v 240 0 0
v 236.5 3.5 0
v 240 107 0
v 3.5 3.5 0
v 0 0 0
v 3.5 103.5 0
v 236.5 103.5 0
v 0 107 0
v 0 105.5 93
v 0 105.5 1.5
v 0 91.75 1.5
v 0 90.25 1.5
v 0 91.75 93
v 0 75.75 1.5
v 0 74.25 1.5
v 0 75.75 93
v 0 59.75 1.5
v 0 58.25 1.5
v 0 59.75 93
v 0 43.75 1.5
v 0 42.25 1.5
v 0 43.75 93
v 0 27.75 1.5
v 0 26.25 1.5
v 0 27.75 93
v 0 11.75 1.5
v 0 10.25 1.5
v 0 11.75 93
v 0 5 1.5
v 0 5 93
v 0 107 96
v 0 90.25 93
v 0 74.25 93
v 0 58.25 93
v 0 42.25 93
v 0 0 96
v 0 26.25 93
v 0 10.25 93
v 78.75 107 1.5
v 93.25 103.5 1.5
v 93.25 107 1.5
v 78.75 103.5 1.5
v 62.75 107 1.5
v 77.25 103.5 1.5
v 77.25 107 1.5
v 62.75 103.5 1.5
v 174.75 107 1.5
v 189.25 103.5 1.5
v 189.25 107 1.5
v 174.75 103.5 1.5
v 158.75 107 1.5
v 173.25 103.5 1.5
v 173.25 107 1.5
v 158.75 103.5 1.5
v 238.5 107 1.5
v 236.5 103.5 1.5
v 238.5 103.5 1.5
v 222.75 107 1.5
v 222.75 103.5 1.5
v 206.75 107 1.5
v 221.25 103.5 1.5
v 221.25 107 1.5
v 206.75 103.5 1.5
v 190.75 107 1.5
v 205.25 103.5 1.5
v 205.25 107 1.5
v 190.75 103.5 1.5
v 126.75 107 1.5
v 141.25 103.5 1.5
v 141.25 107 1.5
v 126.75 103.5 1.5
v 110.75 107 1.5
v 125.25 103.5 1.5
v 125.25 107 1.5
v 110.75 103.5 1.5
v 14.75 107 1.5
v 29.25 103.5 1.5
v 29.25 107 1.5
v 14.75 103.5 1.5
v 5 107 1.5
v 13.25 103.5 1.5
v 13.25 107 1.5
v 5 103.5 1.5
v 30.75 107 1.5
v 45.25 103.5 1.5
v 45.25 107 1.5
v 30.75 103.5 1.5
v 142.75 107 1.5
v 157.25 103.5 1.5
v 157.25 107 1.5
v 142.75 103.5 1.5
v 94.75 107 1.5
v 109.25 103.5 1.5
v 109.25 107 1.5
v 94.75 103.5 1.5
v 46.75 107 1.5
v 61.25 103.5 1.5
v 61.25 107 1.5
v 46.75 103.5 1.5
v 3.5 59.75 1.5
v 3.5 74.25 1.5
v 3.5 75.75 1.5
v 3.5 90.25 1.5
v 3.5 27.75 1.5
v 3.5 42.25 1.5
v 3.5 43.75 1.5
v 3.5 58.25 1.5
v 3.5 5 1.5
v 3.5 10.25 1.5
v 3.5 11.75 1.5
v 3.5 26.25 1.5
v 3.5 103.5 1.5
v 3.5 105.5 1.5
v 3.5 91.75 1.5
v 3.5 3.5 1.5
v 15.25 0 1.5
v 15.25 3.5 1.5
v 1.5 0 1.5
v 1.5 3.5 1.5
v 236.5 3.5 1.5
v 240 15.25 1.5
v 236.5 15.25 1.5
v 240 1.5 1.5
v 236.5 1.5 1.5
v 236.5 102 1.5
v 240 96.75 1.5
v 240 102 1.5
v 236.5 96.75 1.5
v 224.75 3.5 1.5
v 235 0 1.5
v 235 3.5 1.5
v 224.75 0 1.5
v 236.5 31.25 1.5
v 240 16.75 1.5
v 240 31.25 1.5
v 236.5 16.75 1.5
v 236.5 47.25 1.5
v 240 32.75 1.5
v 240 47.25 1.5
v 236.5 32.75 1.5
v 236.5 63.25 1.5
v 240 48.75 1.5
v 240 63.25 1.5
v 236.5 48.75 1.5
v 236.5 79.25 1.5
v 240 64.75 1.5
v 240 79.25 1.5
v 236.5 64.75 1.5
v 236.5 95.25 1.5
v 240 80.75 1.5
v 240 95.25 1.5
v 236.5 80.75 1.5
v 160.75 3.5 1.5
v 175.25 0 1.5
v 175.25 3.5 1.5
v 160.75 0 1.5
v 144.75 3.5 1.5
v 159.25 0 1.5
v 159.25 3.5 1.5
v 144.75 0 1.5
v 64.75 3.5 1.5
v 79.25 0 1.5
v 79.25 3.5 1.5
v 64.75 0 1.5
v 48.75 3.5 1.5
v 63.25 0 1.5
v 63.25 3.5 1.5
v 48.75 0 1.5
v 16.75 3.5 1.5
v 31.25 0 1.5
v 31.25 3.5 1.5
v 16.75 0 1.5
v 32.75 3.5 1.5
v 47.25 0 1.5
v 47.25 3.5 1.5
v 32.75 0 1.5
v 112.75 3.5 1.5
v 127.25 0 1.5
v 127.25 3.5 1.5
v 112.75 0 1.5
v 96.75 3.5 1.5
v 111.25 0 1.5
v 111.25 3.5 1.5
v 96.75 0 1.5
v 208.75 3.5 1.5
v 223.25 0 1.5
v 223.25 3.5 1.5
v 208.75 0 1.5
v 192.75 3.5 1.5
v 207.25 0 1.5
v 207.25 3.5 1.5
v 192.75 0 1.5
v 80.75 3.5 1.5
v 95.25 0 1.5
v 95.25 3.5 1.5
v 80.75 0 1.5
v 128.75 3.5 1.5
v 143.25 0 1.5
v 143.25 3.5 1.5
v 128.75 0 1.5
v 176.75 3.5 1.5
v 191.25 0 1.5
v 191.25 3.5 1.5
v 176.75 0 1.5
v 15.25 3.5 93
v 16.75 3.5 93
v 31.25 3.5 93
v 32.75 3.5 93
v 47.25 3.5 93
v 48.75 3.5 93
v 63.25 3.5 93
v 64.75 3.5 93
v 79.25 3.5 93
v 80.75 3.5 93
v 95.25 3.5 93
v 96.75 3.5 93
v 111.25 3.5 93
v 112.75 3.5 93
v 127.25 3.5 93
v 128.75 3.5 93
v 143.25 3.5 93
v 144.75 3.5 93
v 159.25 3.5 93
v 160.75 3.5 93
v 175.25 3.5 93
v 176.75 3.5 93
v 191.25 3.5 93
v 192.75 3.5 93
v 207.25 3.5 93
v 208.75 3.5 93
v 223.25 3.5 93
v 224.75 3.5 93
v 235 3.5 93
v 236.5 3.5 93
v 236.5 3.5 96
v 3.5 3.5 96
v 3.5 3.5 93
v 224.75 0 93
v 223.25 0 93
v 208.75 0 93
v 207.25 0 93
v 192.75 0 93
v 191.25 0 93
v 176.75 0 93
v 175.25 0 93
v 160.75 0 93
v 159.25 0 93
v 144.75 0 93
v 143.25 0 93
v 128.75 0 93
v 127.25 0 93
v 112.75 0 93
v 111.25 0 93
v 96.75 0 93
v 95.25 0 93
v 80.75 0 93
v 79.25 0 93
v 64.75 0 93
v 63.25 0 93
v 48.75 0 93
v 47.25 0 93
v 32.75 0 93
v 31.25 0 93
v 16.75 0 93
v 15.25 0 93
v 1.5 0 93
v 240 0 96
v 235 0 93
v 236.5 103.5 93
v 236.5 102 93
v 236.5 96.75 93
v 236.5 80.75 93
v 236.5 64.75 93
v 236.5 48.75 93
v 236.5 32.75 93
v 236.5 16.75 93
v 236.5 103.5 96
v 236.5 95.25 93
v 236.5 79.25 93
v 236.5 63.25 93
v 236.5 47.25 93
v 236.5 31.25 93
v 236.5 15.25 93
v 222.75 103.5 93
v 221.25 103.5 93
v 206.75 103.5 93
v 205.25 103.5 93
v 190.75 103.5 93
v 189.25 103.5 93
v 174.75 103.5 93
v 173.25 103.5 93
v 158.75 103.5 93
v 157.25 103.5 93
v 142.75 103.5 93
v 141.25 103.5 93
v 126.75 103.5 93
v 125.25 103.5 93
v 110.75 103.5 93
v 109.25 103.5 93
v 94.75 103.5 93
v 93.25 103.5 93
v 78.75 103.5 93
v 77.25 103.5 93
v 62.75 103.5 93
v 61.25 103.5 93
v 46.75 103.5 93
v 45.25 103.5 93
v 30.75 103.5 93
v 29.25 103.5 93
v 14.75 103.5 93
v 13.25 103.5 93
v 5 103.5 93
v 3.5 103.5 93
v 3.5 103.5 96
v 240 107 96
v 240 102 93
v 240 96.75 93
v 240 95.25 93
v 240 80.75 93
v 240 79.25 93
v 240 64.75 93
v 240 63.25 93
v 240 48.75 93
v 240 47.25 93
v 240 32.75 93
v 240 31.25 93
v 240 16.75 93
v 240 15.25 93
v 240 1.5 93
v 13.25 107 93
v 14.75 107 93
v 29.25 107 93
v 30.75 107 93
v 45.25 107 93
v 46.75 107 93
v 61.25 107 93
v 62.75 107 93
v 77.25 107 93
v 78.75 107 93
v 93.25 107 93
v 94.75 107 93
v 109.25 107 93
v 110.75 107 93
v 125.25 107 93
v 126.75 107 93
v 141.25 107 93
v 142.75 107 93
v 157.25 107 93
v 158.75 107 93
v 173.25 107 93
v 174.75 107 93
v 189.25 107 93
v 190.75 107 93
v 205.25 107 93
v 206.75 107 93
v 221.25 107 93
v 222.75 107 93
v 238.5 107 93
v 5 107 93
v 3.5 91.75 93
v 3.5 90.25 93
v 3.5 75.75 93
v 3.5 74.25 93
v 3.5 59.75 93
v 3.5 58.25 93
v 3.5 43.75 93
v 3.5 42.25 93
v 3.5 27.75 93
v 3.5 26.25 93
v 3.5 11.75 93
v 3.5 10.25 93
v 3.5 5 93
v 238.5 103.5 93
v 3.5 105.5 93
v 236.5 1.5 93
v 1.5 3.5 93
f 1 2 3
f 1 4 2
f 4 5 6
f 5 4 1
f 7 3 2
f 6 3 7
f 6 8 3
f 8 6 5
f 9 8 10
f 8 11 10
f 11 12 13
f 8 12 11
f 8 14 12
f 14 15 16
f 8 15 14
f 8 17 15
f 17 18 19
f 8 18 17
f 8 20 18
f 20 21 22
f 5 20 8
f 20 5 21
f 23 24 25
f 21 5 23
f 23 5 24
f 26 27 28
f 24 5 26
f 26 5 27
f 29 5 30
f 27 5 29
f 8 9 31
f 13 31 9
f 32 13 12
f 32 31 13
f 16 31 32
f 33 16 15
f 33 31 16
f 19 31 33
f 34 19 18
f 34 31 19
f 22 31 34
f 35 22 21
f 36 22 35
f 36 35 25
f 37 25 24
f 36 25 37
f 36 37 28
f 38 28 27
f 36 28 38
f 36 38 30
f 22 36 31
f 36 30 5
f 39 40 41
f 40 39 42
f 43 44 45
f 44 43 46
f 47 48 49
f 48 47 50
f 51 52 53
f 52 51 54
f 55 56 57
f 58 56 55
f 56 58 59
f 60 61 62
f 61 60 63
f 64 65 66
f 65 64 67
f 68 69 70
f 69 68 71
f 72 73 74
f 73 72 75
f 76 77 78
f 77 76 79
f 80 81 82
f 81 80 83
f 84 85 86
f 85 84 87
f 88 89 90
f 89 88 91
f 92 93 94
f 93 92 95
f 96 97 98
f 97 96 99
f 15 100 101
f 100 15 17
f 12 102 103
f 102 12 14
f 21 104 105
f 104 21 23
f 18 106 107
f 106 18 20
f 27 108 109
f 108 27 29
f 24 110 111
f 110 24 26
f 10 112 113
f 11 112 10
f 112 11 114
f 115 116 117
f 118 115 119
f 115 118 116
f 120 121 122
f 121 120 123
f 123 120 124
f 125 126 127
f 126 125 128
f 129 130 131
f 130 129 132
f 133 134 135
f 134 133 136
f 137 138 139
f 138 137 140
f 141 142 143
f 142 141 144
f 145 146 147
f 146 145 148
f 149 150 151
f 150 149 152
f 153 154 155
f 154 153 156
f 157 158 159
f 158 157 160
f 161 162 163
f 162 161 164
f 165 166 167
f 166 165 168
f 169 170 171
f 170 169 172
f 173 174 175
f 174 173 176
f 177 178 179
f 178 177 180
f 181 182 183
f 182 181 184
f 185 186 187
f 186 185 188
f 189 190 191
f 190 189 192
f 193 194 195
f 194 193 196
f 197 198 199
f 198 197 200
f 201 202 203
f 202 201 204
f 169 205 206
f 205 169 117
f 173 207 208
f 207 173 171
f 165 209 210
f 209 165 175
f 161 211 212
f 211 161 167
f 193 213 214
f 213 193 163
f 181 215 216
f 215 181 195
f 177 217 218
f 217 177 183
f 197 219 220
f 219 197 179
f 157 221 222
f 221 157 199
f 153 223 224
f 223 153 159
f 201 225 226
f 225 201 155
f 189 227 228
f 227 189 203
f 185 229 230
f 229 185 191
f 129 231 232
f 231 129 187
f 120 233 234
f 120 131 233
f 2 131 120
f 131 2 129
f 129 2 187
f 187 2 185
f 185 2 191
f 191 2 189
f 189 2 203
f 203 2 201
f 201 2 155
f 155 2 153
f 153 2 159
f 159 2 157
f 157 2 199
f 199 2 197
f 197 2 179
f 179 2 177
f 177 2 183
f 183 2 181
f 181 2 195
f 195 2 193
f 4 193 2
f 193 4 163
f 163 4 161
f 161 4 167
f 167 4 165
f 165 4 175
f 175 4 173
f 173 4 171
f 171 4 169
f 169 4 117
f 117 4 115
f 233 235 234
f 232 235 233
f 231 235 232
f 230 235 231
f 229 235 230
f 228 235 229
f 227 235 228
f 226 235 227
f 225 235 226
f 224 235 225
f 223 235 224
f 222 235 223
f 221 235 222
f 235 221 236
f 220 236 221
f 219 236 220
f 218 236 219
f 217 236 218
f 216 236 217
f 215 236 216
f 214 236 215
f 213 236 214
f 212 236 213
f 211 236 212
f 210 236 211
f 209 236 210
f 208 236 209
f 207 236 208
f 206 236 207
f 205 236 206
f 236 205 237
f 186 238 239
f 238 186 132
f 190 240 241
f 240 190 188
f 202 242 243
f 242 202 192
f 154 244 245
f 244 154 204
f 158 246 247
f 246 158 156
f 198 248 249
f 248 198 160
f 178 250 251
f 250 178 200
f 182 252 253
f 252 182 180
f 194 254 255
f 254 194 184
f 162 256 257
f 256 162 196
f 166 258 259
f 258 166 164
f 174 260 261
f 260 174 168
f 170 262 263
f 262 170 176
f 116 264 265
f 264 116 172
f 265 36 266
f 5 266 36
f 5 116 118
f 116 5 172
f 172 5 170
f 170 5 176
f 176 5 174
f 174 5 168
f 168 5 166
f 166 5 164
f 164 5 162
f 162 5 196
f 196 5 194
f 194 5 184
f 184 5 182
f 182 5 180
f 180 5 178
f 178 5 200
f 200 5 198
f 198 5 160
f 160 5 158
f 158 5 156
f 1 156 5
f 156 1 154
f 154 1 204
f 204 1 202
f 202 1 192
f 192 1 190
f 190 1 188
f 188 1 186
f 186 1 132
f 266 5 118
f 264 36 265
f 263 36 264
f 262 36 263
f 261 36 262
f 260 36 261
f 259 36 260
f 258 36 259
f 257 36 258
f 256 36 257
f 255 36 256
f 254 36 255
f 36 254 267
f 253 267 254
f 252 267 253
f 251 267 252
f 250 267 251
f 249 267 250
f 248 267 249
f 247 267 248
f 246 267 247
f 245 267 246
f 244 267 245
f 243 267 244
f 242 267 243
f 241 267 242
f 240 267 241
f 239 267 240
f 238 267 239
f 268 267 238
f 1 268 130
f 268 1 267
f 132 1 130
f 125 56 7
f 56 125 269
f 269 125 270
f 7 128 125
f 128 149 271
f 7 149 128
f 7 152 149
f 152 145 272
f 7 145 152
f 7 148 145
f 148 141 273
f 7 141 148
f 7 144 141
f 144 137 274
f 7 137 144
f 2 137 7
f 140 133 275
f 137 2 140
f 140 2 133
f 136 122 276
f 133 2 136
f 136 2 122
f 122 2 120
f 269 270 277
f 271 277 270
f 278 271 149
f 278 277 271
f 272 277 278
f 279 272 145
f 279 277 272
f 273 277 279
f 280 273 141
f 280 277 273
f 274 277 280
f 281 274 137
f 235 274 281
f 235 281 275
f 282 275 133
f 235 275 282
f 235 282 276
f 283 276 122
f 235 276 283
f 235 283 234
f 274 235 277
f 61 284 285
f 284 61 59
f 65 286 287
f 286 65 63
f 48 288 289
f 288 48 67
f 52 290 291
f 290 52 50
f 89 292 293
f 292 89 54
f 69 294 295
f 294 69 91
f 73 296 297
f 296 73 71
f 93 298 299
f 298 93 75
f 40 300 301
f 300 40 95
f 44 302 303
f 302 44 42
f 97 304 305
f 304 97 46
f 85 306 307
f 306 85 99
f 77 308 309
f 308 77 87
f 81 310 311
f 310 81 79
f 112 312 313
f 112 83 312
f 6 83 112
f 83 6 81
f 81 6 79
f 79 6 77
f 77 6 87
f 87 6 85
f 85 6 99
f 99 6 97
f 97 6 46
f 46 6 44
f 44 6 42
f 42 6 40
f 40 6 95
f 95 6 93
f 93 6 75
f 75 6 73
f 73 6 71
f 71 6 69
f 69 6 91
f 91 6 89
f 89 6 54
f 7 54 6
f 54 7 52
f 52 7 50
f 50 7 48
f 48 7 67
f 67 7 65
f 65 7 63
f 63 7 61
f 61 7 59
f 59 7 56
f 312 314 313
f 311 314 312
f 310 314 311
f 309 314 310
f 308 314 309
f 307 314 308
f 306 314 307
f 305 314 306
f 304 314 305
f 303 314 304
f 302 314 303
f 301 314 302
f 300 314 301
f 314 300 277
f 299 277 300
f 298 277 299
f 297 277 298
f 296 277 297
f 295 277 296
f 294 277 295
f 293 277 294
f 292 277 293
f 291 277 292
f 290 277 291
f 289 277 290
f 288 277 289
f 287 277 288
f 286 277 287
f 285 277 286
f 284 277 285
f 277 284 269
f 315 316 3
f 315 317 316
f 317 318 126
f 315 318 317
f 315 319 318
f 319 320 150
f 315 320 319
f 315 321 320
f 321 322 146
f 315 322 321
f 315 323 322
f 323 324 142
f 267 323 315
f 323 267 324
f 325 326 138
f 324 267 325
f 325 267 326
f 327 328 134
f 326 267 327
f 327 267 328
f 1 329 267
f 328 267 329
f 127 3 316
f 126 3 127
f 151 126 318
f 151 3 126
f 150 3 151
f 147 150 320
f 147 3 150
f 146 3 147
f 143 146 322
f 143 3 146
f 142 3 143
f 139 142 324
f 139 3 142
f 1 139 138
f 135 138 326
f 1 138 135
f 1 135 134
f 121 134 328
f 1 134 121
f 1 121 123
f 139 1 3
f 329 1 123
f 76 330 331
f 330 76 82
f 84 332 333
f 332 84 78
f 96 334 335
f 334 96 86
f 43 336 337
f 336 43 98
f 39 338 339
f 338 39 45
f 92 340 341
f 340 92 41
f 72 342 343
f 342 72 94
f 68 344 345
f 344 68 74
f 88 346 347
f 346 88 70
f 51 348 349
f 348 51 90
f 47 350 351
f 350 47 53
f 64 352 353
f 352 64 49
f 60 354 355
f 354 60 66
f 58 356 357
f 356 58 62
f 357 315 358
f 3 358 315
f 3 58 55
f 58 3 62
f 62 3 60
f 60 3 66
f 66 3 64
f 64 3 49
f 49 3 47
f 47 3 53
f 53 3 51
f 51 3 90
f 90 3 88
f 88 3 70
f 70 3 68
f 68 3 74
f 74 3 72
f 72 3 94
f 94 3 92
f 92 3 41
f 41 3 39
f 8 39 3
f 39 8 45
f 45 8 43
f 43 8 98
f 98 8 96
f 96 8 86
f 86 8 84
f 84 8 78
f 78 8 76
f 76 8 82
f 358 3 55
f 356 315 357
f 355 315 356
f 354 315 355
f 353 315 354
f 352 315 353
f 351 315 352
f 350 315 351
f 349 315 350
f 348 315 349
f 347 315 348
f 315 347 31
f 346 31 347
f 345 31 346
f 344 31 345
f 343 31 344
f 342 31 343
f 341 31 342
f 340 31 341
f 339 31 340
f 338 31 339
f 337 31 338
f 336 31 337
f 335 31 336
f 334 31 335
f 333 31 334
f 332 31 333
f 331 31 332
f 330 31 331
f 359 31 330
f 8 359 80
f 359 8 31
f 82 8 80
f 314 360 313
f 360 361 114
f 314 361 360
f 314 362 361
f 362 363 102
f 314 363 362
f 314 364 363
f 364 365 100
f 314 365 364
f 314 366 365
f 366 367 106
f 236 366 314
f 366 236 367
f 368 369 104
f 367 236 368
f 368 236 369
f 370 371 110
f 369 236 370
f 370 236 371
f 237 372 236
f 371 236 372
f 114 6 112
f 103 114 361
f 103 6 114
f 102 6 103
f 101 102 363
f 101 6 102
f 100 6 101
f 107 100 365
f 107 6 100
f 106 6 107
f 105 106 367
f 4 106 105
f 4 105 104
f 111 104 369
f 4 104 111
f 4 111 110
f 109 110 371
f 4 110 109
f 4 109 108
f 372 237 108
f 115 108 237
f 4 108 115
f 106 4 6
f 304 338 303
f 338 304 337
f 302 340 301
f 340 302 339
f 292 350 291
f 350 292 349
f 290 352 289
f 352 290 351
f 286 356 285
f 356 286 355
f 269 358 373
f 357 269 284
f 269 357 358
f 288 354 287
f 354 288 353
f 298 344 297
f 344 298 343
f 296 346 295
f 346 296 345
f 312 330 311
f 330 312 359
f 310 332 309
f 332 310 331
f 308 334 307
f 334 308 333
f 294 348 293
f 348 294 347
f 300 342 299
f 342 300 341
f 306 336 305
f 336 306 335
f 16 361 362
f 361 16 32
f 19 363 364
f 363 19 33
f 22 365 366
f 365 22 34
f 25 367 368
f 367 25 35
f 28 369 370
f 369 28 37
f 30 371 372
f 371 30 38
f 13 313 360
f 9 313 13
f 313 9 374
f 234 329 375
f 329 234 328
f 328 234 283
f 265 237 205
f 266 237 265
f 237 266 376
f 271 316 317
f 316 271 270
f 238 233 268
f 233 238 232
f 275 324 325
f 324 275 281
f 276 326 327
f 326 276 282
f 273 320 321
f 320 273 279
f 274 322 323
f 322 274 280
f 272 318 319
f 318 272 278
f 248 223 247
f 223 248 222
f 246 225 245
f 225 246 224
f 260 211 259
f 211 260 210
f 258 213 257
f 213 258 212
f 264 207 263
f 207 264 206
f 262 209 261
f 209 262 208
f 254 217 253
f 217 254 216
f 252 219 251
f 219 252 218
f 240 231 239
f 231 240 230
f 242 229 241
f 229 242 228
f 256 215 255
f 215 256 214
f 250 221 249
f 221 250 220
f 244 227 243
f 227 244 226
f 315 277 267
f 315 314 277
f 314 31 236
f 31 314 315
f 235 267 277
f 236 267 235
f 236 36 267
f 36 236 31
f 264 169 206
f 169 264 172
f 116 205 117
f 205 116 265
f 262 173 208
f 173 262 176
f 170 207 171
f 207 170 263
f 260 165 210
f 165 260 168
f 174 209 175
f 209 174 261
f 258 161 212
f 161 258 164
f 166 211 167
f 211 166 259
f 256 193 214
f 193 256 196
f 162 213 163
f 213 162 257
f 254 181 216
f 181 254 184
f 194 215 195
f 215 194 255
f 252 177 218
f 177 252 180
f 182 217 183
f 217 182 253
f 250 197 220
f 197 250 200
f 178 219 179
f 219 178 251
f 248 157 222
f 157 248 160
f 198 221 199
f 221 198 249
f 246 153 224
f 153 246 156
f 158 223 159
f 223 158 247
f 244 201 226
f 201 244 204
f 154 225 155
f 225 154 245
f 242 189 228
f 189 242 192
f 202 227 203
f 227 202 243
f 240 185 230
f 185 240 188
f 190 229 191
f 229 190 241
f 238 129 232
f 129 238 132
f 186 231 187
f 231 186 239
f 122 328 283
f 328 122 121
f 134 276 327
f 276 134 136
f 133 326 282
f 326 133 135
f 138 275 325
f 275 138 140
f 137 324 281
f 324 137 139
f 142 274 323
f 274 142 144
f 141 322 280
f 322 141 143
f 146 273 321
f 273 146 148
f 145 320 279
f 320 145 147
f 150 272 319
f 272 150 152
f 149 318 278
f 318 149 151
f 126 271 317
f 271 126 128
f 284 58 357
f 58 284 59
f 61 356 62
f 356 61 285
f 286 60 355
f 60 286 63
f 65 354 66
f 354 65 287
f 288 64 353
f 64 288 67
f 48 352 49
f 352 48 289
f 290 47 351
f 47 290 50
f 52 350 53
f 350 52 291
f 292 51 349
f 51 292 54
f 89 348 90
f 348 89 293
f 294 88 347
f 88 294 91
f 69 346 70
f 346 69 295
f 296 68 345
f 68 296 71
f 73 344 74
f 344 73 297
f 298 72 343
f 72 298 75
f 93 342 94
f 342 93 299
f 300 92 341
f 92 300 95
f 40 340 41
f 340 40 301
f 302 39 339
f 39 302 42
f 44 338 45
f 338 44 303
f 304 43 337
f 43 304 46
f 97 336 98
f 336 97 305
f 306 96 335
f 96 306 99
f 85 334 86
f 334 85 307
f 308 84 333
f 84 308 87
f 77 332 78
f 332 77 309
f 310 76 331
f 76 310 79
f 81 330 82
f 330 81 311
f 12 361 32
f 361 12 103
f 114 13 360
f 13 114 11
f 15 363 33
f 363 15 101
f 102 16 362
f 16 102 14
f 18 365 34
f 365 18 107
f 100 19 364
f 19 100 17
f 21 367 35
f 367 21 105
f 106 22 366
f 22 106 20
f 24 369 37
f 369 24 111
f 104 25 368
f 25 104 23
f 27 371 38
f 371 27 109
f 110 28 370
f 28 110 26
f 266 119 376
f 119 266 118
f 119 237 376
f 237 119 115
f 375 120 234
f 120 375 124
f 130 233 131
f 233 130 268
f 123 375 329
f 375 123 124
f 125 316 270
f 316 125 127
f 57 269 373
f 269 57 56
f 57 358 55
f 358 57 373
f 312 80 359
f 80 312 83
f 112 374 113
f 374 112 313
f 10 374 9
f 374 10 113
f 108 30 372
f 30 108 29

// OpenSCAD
// file: lumber.scad
use <utilities.scad>;

// Stick
module 2x4x8(cut=[0, 0, 0]) {
    echo("2x4x8");
    cube([inches(1, 1/2) - cut[0], inches(3, 1/2) - cut[1], feet(8) - cut[2]]);
};

module 2x6x8(cut=[0, 0, 0]) {
    echo("2x6x8");
    cube([inches(1, 1/2) - cut[0], inches(5, 1/2) - cut[1], feet(8) - cut[2]]);
};

// Sheet
module 4x8x1_2(cut=[0, 0, 0]) {
    echo("4x8x1/2");
    cube([feet(4) - cut[0], feet(8) - cut[1], inches(0, 1/2) - cut[2]]);
};

module 4x8x3_4(cut=[0, 0, 0]) {
    echo("4x8x3/4");
    cube([feet(4) - cut[0], feet(8) - cut[1], inches(0, 3/4) - cut[2]]);
};

2x4x8();

translate([24, 0, 0])
    2x6x8();

translate([48, 0, 0])
    4x8x1_2();

translate([120, 0, 0])
    4x8x3_4();
// file: utilities.scad
function feet(f) = f * 12;
function inches(i=0, f=0) = i+f; 
// main file
use <utilities.scad>;
use <lumber.scad>;

module frame_walls(start_height=0, wall_height=feet(8), width=feet(20), depth=feet(8) + inches(11)) {
    stud_cut_length = feet(8) - wall_height + inches(4, 1/2);
    assert(stud_cut_length > -0.00000000001, "Your wall height has exceeded your lumber length");
    
    for (a=[0:1]) { // Top and Bottom Plate
        // South Plates
        for (b=[0:feet(8):width]) {      
            trim = b + feet(8) > width ? [0, 0, b + feet(8) - width + inches(3, 1/2)] : [0, 0, 0];

            translate([b, 0, inches(1, 1/2) + start_height + a * (wall_height - inches(3))])
                rotate(a=[0,90,0])
                    2x4x8(cut=trim);
        }
        
        // Add a second top plate
        if (a == 1) {
            for (b=[width:-feet(8):0]) {
                echo("b:",b);
                trim = b < feet(8) ? [0, 0, feet(8) - b + inches(3, 1/2)]: [0, 0, 0];
           
                translate([b - feet(8) + trim[2], 0, a * wall_height + start_height])
                    rotate(a=[0,90,0])
                        2x4x8(cut=trim);
            }
        }
        
        // East Plates
        for (b=[0:feet(8):depth]) { // near to far
            translate([width, 0, inches(1, 1/2) + start_height + a * (wall_height - inches(3))])
                rotate(a=[270,90,0])
                    2x4x8(cut=[0, 0, feet(8) - depth + inches(3, 1/2)]);
        }
        
        // Add a second top plate
        if (a == 1) {
            for (b=[0:feet(8):depth]) { // near to far
                translate([width, inches(3, 1/2), a * wall_height + start_height])
                    rotate(a=[270,90,0])
                        2x4x8(cut=[0, 0, feet(8) - depth + inches(3, 1/2)]);
            }
        }
        
        // North Plates
        for (b=[width:-feet(8):0]) { // Right to left
            trim = b < feet(8) ? [0, 0, feet(8) - b + 3.5] : [0, 0, 0];

            translate([b, depth - inches(3, 1/2), a * (wall_height - inches(3))])
                rotate(a=[0,270,0])
                    2x4x8(cut=trim);
        }

        // Add a second top plate
        if (a == 1) {
            for (b=[0:feet(8):width]) { // Right to left
                trim = width - b < feet(8) ? [0, 0, feet(8) - (width - b) + inches(3, 1/2)] : [0, 0, 0];

                translate([b, depth - inches(3, 1/2), a * wall_height + start_height])
                    rotate(a=[0,90,0])
                        2x4x8(cut=trim);
            }
        }
        
        // West Plates
        for (b=[0:feet(8):depth]) { // near to far
            translate([0, depth, inches(1, 1/2) + start_height + a * (wall_height - inches(3))])
                rotate(a=[90,90,0])
                    2x4x8(cut=[0, 0, feet(8) - depth + inches(3, 1/2)]);
        }
        
        // Add a second top plate
        if (a == 1) {
            for (b=[0:feet(8):depth]) { // near to far
                translate([0, depth - inches(3, 1/2), a * wall_height + start_height])
                    rotate(a=[90,90,0])
                        2x4x8(cut=[0, 0, feet(8) - depth + inches(3, 1/2)]);
            }
        }
    }
    
    // South Wall
    translate([0, 0, inches(1, 1/2) + start_height])
        2x4x8(cut=[0, 0, stud_cut_length]);
    
    let(stud_placement = [ for ( i = [inches(15, 1/4):inches(16):width - inches(1, 1/2)] ) i]) {  // Switch to specific studs when we add window and door framing
        for (stud = stud_placement) {
            translate([stud, 0, inches(1, 1/2) + start_height])
                2x4x8(cut=[0, 0, stud_cut_length]);
        }
    }
    
    translate([width - inches(5), 0, inches(1, 1/2) + start_height])
        2x4x8(cut=[0, 0, stud_cut_length]);

    // East Wall
    translate([width - inches(3, 1/2), inches(1, 1/2), inches(1, 1/2) + start_height])
        rotate(a=[0,0,270])
            2x4x8(cut=[0, 0, stud_cut_length]);
    
    let(stud_placement = [for ( i = [inches(15, 1/4):inches(16):depth- inches(1, 1/2)] ) i]) {  // Switch to specific studs when we add window and door framing
        for (stud = stud_placement) {
        translate([width - inches(3, 1/2), inches(1, 1/2) + stud, inches(1, 1/2) + start_height])
            rotate(a=[0,0,270])
                2x4x8(cut=[0, 0, stud_cut_length]);
        }
    }
 
    translate([width - inches(3, 1/2), depth - inches(3, 1/2), inches(1, 1/2) + start_height])
        rotate(a=[0,0,270])
            2x4x8(cut=[0, 0, stud_cut_length]);

    // North Wall
    translate([width - inches(1, 1/2), depth - inches(3, 1/2), inches(1, 1/2) + start_height])
        2x4x8(cut=[0, 0, stud_cut_length]);
    
    let(stud_placement = [for ( i = [inches(15, 1/4):inches(16):width - inches(1, 1/2)] ) i]) {  // Switch to specific studs when we add window and door framing
        for (stud = stud_placement) {
            translate([width - inches(3, 1/2) - stud, depth - inches(3, 1/2), inches(1, 1/2) + start_height])
                2x4x8(cut=[0, 0, stud_cut_length]);
        }
    }
    
    translate([inches(3, 1/2), depth - inches(3, 1/2), inches(1, 1/2) + start_height])
        2x4x8(cut=[0, 0, stud_cut_length]);

    // West Wall
    translate([0, depth, inches(1, 1/2) + start_height])
        rotate(a=[0,0,270])
            2x4x8(cut=[0, 0, stud_cut_length]);
    
    let(stud_placement = [for ( i = [inches(15, 1/4):inches(16):depth - inches(1, 1/2)] ) i]) {  // Switch to specific studs when we add window and door framing
        for (stud = stud_placement) {
        translate([0, depth - stud, inches(1, 1/2) + start_height])
            rotate(a=[0,0,270])
                2x4x8(cut=[0, 0, stud_cut_length]);
        }
    }
    
    translate([0, inches(5), inches(1, 1/2) + start_height])
        rotate(a=[0,0,270])
            2x4x8(cut=[0, 0, stud_cut_length]);
}

frame_walls();
